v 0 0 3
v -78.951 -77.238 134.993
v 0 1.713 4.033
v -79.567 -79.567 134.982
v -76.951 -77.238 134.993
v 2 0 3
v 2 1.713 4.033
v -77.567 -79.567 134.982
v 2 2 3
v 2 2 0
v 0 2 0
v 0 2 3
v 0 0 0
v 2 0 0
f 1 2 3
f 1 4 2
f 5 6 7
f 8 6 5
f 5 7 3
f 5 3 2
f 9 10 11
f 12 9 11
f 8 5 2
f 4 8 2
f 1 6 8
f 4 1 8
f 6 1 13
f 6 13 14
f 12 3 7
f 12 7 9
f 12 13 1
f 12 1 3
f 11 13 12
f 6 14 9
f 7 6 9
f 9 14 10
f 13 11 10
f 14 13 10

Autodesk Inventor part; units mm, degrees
ref_plane "YZ Plane" through (0, 0, 0) normal (1, 0, 0) x (0, 1, 0)
sketch "Skizze1" plane through (0, 0, 0) normal (0, 0, 1) x (1, 0, 0)
  line L0 (0, 0) -> (2, 0)
  line L1 (2, 0) -> (2, 2)
  line L2 (2, 2) -> (0, 2)
  line L3 (0, 2) -> (0, 0)
  dimension "d0" = 2
  dimension "d1" = 2
extrude "Extrusion1" add sketch "Skizze1" along normal blind 3
sketch "Skizze2" plane through (0, 0, 3) normal (0, 0, 1) x (1, 0, 0)
  point P0 (0, 0)
ref_plane "Arbeitsebene1" through (0, 0, 3) normal (-0.7071068, 0.7071068, 0) x (0.7071068, 0.7071068, 0)
sketch "Skizze3" plane through (0, 0, 3) normal (-0.7071068, 0.7071068, 0) x (0.7071068, 0.7071068, 0)
  line L0 (0, 0) -> (1.4142, 0) projected
  line L1 (0, 0) -> (-112.5245, -131.9823)
  line L2 (0, 0) -> (173.439, 0) construction
  line L3 (2.8284, 3) -> (2.8284, 0) projected
  line L4 (2.8284, 0) -> (-109.6961, -131.9823)
  line L5 (2.8284, 0) -> (176.2674, 0) construction
  line L6 (-109.6961, -131.9823) -> (-112.5245, -131.9823)
  line L7 (1.4142, 0) -> (2.8284, 0) projected
  line L8 (2.8284, 0) -> (0, 0)
  point P0 (0, 3)
  dimension "d4" = 173.439
  dimension "d5" = 130.45
  dimension "d6" = 173.439
  dimension "d7" = 130.45
ref_plane "Arbeitsebene2" through (0, 0, 3) normal (0, 0.8564105, 0.5162955) x (-0.4587597, -0.4587597, 0.7609724)
sketch "Skizze4" plane through (0, 0, 3) normal (0, 0.8564105, 0.5162955) x (-0.4587597, -0.4587597, 0.7609724)
  line L0 (0, 0) -> (-0.9175, 1.7771) projected
  line L1 (0, 0) -> (-0.9175, 1.7771)
  line L2 (-0.9175, 1.7771) -> (172.5215, 1.7771)
  line L3 (172.5215, 1.7771) -> (173.439, 0)
  line L4 (173.439, 0) -> (0, 0)
  point P0 (-2.2829, -1.1787)
  dimension "d9" = 173.439
extrude "Extrusion2" add sketch "Skizze4" along normal blind 2
sketch "Skizze5" plane through (-77.5668, -79.5668, 134.9823) normal (0.8885604, -0.2368556, 0.3928866) x (0.4587597, 0.4587597, -0.7609724)
  line L0 (172.5215, 0) -> (-0.9175, 0) projected
  line L1 (0.0005, 0) -> (1.3553, 2)
  line L2 (0, 2) -> (173.439, 2) projected
  line L3 (1.3553, 2) -> (0, 2)
  line L4 (0, 0) -> (0, 2) projected
  line L5 (0, 2) -> (0, 0)
  point P0 (174.8044, -1.5489)
sketch "Skizze6" plane through (0, 0, 3) normal (0, -0.8564105, -0.5162955) x (0.8885604, -0.2368556, 0.3928866)
  line L0 (0, 0) -> (0, 173.439) projected
  line L1 (1.7771, 172.5215) -> (0, 173.439)
  point P0 (-1.1787, -2.2829)
sketch "Skizze7" plane through (0, 1.7128, 4.0326) normal (0, 0.8564105, 0.5162955) x (0.8885604, -0.2368556, 0.3928866)
  line L0 (0, 0) -> (0, -173.439) projected
  line L1 (0, -172.1027) -> (1.781, -171.1647)
  point P0 (-1.1787, 2.2829)
sketch "Skizze8" plane through (0, 0, 3) normal (-0.8885604, 0.2368556, -0.3928866) x (-0.4587597, -0.4587597, 0.7609724)
  line L0 (0, 2) -> (173.439, 2) projected
  line L1 (0, 0) -> (173.439, 0) projected
  line L2 (172.1026, 2) -> (173.439, 0)
  point P0 (-2.2829, -1.5489)
chamfer "Fase1" distance 1.1929 distance2 2 1 edges at (-78.5668, -77.854, 136.0149) measured on face at (-25.1889, -24.8095, 48.0267)
ref_plane "Arbeitsebene3" through (2, 0, 3) normal (-1, 0, 0) x (0, 0.8564105, 0.5162955)
sketch "Skizze12" plane through (2, 0, 3) normal (-1, 0, 0) x (0, 0.8564105, 0.5162955)
  line L0 (0, 0) -> (1.7128, 1.0326) projected
  line L1 (0, 0) -> (2, 0)
  line L2 (-1.5489, 2.5692) -> (0, 0) projected
  line L3 (0, 0) -> (1.7128, 1.0326)
  line L4 (2, 0) -> (1.7128, 1.0326)
extrude "Extrusion6" add sketch "Skizze12" along normal blind 2
properties part number "FOVStick"
